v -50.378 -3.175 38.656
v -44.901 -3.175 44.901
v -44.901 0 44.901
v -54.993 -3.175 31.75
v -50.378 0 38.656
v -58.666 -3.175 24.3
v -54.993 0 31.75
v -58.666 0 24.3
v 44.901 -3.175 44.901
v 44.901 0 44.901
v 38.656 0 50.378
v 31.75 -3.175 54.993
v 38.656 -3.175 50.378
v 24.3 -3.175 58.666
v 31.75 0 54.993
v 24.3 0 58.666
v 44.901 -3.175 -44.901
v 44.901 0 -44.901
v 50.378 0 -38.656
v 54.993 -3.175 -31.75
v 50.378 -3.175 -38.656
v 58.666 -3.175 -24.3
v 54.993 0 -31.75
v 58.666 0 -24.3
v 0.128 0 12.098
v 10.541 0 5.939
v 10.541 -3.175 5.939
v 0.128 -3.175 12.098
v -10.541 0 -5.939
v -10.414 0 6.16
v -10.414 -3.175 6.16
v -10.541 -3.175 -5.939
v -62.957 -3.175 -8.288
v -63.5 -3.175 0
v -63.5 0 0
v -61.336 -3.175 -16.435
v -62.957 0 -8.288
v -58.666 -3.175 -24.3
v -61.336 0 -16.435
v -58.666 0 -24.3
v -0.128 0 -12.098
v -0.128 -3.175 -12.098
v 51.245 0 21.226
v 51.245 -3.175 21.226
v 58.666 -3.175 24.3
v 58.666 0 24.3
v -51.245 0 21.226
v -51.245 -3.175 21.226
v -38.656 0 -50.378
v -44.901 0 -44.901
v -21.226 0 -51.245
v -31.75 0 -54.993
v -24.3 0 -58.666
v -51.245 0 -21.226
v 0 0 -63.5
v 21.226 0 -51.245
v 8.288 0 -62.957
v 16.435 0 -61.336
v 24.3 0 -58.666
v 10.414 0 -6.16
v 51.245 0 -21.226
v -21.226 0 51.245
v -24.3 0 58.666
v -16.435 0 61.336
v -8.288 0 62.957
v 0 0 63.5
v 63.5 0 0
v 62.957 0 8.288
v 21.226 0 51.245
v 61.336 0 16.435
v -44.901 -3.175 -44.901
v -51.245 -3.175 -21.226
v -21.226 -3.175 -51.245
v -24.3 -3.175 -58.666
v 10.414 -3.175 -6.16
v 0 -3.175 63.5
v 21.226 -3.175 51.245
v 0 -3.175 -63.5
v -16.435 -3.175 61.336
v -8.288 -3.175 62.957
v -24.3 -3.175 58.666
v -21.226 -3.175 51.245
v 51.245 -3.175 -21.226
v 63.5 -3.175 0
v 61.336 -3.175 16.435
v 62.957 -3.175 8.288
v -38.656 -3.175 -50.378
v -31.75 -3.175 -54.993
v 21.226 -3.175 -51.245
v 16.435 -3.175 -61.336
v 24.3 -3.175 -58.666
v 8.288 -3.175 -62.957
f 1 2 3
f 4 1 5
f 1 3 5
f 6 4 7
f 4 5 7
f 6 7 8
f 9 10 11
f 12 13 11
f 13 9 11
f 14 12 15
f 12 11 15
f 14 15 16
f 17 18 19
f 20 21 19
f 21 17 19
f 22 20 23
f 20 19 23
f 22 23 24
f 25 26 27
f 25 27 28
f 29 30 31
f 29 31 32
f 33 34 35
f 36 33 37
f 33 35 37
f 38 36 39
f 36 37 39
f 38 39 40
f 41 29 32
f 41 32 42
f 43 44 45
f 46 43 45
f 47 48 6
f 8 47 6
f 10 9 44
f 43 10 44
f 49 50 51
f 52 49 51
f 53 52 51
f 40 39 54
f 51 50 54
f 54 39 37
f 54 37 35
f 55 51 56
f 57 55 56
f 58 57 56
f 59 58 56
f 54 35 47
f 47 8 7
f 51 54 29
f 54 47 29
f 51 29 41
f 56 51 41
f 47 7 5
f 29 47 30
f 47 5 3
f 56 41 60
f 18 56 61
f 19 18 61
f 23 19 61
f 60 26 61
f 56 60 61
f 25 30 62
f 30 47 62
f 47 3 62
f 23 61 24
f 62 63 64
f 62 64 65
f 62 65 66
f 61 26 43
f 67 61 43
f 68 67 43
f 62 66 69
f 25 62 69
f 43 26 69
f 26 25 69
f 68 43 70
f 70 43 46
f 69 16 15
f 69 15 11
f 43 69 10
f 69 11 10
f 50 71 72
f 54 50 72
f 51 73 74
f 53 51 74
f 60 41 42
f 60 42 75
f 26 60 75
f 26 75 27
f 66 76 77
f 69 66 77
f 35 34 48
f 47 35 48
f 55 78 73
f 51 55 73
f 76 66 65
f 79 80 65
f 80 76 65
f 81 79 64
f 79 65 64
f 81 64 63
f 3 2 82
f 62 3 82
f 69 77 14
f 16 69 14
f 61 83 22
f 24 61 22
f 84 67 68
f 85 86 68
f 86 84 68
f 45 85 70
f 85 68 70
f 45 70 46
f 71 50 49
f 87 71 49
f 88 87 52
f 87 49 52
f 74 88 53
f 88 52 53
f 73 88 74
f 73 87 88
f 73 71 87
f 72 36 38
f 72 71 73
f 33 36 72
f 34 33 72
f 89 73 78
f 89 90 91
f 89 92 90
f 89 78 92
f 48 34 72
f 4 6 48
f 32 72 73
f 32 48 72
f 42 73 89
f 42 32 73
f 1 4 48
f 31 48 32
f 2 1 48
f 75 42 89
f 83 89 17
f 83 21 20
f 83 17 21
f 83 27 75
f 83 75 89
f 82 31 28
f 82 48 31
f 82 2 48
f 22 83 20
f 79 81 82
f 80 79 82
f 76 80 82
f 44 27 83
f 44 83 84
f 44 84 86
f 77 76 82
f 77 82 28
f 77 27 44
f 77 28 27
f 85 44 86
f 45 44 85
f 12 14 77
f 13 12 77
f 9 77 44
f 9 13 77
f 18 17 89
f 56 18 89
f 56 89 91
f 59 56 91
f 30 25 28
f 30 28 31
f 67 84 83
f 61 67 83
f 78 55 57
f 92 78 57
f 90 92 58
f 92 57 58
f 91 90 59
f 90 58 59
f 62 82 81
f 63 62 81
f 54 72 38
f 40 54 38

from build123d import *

# Parameters (mm, degrees)
F0_R            = 63.5
F1_DEPTH        = 3.175
F3_DEPTH        = 3.175
F3_COPIES_COUNT = 8
F5_DEPTH        = 3.175


# Not quite as in the source:
# - a pattern or mirror of a feature is missing from the dataset's text; its kind, count and spacing are read off the source's solid


with BuildPart() as f1:
    # F0 (on Front) → F1 (new body)
    with BuildSketch(Plane.XZ):
        Circle(F0_R)
    extrude(amount=F1_DEPTH)

    # F2 (on face) → F3 (cut)
    with BuildSketch(Plane.XZ.offset(3.175)):
        with BuildLine():
            Line((0, 63.5), (21.2263563726, 51.2449574344))
            Line((21.2263563726, 51.2449574344), (24.3003979552, 58.6663503145))
            ThreePointArc((24.3003979552, 58.6663503145), (12.388235448, 62.2798653056), (0, 63.5))
        make_face()
    f3 = extrude(amount=-F3_DEPTH, mode=Mode.SUBTRACT)

    # F3_copies: F3 ×8 about axis
    f3_copies_axis = Axis((0, 0, 0), (0, 1, 0))
    for i in range(1, F3_COPIES_COUNT):
        add(f3.rotate(f3_copies_axis, i * 360 / F3_COPIES_COUNT), mode=Mode.SUBTRACT)

    # F4 (on Front) → F5 (cut)
    with BuildSketch(Plane.XZ):
        Polygon((0.1275317148, 12.0983748909), (-10.4137341426, 6.1596331502), (-10.5412658574, -5.9387417407), (-0.1275317148, -12.0983748909), (10.4137341426, -6.1596331502), (10.5412658574, 5.9387417407), align=None)
    extrude(amount=F5_DEPTH, mode=Mode.SUBTRACT)


solid = f1.part
